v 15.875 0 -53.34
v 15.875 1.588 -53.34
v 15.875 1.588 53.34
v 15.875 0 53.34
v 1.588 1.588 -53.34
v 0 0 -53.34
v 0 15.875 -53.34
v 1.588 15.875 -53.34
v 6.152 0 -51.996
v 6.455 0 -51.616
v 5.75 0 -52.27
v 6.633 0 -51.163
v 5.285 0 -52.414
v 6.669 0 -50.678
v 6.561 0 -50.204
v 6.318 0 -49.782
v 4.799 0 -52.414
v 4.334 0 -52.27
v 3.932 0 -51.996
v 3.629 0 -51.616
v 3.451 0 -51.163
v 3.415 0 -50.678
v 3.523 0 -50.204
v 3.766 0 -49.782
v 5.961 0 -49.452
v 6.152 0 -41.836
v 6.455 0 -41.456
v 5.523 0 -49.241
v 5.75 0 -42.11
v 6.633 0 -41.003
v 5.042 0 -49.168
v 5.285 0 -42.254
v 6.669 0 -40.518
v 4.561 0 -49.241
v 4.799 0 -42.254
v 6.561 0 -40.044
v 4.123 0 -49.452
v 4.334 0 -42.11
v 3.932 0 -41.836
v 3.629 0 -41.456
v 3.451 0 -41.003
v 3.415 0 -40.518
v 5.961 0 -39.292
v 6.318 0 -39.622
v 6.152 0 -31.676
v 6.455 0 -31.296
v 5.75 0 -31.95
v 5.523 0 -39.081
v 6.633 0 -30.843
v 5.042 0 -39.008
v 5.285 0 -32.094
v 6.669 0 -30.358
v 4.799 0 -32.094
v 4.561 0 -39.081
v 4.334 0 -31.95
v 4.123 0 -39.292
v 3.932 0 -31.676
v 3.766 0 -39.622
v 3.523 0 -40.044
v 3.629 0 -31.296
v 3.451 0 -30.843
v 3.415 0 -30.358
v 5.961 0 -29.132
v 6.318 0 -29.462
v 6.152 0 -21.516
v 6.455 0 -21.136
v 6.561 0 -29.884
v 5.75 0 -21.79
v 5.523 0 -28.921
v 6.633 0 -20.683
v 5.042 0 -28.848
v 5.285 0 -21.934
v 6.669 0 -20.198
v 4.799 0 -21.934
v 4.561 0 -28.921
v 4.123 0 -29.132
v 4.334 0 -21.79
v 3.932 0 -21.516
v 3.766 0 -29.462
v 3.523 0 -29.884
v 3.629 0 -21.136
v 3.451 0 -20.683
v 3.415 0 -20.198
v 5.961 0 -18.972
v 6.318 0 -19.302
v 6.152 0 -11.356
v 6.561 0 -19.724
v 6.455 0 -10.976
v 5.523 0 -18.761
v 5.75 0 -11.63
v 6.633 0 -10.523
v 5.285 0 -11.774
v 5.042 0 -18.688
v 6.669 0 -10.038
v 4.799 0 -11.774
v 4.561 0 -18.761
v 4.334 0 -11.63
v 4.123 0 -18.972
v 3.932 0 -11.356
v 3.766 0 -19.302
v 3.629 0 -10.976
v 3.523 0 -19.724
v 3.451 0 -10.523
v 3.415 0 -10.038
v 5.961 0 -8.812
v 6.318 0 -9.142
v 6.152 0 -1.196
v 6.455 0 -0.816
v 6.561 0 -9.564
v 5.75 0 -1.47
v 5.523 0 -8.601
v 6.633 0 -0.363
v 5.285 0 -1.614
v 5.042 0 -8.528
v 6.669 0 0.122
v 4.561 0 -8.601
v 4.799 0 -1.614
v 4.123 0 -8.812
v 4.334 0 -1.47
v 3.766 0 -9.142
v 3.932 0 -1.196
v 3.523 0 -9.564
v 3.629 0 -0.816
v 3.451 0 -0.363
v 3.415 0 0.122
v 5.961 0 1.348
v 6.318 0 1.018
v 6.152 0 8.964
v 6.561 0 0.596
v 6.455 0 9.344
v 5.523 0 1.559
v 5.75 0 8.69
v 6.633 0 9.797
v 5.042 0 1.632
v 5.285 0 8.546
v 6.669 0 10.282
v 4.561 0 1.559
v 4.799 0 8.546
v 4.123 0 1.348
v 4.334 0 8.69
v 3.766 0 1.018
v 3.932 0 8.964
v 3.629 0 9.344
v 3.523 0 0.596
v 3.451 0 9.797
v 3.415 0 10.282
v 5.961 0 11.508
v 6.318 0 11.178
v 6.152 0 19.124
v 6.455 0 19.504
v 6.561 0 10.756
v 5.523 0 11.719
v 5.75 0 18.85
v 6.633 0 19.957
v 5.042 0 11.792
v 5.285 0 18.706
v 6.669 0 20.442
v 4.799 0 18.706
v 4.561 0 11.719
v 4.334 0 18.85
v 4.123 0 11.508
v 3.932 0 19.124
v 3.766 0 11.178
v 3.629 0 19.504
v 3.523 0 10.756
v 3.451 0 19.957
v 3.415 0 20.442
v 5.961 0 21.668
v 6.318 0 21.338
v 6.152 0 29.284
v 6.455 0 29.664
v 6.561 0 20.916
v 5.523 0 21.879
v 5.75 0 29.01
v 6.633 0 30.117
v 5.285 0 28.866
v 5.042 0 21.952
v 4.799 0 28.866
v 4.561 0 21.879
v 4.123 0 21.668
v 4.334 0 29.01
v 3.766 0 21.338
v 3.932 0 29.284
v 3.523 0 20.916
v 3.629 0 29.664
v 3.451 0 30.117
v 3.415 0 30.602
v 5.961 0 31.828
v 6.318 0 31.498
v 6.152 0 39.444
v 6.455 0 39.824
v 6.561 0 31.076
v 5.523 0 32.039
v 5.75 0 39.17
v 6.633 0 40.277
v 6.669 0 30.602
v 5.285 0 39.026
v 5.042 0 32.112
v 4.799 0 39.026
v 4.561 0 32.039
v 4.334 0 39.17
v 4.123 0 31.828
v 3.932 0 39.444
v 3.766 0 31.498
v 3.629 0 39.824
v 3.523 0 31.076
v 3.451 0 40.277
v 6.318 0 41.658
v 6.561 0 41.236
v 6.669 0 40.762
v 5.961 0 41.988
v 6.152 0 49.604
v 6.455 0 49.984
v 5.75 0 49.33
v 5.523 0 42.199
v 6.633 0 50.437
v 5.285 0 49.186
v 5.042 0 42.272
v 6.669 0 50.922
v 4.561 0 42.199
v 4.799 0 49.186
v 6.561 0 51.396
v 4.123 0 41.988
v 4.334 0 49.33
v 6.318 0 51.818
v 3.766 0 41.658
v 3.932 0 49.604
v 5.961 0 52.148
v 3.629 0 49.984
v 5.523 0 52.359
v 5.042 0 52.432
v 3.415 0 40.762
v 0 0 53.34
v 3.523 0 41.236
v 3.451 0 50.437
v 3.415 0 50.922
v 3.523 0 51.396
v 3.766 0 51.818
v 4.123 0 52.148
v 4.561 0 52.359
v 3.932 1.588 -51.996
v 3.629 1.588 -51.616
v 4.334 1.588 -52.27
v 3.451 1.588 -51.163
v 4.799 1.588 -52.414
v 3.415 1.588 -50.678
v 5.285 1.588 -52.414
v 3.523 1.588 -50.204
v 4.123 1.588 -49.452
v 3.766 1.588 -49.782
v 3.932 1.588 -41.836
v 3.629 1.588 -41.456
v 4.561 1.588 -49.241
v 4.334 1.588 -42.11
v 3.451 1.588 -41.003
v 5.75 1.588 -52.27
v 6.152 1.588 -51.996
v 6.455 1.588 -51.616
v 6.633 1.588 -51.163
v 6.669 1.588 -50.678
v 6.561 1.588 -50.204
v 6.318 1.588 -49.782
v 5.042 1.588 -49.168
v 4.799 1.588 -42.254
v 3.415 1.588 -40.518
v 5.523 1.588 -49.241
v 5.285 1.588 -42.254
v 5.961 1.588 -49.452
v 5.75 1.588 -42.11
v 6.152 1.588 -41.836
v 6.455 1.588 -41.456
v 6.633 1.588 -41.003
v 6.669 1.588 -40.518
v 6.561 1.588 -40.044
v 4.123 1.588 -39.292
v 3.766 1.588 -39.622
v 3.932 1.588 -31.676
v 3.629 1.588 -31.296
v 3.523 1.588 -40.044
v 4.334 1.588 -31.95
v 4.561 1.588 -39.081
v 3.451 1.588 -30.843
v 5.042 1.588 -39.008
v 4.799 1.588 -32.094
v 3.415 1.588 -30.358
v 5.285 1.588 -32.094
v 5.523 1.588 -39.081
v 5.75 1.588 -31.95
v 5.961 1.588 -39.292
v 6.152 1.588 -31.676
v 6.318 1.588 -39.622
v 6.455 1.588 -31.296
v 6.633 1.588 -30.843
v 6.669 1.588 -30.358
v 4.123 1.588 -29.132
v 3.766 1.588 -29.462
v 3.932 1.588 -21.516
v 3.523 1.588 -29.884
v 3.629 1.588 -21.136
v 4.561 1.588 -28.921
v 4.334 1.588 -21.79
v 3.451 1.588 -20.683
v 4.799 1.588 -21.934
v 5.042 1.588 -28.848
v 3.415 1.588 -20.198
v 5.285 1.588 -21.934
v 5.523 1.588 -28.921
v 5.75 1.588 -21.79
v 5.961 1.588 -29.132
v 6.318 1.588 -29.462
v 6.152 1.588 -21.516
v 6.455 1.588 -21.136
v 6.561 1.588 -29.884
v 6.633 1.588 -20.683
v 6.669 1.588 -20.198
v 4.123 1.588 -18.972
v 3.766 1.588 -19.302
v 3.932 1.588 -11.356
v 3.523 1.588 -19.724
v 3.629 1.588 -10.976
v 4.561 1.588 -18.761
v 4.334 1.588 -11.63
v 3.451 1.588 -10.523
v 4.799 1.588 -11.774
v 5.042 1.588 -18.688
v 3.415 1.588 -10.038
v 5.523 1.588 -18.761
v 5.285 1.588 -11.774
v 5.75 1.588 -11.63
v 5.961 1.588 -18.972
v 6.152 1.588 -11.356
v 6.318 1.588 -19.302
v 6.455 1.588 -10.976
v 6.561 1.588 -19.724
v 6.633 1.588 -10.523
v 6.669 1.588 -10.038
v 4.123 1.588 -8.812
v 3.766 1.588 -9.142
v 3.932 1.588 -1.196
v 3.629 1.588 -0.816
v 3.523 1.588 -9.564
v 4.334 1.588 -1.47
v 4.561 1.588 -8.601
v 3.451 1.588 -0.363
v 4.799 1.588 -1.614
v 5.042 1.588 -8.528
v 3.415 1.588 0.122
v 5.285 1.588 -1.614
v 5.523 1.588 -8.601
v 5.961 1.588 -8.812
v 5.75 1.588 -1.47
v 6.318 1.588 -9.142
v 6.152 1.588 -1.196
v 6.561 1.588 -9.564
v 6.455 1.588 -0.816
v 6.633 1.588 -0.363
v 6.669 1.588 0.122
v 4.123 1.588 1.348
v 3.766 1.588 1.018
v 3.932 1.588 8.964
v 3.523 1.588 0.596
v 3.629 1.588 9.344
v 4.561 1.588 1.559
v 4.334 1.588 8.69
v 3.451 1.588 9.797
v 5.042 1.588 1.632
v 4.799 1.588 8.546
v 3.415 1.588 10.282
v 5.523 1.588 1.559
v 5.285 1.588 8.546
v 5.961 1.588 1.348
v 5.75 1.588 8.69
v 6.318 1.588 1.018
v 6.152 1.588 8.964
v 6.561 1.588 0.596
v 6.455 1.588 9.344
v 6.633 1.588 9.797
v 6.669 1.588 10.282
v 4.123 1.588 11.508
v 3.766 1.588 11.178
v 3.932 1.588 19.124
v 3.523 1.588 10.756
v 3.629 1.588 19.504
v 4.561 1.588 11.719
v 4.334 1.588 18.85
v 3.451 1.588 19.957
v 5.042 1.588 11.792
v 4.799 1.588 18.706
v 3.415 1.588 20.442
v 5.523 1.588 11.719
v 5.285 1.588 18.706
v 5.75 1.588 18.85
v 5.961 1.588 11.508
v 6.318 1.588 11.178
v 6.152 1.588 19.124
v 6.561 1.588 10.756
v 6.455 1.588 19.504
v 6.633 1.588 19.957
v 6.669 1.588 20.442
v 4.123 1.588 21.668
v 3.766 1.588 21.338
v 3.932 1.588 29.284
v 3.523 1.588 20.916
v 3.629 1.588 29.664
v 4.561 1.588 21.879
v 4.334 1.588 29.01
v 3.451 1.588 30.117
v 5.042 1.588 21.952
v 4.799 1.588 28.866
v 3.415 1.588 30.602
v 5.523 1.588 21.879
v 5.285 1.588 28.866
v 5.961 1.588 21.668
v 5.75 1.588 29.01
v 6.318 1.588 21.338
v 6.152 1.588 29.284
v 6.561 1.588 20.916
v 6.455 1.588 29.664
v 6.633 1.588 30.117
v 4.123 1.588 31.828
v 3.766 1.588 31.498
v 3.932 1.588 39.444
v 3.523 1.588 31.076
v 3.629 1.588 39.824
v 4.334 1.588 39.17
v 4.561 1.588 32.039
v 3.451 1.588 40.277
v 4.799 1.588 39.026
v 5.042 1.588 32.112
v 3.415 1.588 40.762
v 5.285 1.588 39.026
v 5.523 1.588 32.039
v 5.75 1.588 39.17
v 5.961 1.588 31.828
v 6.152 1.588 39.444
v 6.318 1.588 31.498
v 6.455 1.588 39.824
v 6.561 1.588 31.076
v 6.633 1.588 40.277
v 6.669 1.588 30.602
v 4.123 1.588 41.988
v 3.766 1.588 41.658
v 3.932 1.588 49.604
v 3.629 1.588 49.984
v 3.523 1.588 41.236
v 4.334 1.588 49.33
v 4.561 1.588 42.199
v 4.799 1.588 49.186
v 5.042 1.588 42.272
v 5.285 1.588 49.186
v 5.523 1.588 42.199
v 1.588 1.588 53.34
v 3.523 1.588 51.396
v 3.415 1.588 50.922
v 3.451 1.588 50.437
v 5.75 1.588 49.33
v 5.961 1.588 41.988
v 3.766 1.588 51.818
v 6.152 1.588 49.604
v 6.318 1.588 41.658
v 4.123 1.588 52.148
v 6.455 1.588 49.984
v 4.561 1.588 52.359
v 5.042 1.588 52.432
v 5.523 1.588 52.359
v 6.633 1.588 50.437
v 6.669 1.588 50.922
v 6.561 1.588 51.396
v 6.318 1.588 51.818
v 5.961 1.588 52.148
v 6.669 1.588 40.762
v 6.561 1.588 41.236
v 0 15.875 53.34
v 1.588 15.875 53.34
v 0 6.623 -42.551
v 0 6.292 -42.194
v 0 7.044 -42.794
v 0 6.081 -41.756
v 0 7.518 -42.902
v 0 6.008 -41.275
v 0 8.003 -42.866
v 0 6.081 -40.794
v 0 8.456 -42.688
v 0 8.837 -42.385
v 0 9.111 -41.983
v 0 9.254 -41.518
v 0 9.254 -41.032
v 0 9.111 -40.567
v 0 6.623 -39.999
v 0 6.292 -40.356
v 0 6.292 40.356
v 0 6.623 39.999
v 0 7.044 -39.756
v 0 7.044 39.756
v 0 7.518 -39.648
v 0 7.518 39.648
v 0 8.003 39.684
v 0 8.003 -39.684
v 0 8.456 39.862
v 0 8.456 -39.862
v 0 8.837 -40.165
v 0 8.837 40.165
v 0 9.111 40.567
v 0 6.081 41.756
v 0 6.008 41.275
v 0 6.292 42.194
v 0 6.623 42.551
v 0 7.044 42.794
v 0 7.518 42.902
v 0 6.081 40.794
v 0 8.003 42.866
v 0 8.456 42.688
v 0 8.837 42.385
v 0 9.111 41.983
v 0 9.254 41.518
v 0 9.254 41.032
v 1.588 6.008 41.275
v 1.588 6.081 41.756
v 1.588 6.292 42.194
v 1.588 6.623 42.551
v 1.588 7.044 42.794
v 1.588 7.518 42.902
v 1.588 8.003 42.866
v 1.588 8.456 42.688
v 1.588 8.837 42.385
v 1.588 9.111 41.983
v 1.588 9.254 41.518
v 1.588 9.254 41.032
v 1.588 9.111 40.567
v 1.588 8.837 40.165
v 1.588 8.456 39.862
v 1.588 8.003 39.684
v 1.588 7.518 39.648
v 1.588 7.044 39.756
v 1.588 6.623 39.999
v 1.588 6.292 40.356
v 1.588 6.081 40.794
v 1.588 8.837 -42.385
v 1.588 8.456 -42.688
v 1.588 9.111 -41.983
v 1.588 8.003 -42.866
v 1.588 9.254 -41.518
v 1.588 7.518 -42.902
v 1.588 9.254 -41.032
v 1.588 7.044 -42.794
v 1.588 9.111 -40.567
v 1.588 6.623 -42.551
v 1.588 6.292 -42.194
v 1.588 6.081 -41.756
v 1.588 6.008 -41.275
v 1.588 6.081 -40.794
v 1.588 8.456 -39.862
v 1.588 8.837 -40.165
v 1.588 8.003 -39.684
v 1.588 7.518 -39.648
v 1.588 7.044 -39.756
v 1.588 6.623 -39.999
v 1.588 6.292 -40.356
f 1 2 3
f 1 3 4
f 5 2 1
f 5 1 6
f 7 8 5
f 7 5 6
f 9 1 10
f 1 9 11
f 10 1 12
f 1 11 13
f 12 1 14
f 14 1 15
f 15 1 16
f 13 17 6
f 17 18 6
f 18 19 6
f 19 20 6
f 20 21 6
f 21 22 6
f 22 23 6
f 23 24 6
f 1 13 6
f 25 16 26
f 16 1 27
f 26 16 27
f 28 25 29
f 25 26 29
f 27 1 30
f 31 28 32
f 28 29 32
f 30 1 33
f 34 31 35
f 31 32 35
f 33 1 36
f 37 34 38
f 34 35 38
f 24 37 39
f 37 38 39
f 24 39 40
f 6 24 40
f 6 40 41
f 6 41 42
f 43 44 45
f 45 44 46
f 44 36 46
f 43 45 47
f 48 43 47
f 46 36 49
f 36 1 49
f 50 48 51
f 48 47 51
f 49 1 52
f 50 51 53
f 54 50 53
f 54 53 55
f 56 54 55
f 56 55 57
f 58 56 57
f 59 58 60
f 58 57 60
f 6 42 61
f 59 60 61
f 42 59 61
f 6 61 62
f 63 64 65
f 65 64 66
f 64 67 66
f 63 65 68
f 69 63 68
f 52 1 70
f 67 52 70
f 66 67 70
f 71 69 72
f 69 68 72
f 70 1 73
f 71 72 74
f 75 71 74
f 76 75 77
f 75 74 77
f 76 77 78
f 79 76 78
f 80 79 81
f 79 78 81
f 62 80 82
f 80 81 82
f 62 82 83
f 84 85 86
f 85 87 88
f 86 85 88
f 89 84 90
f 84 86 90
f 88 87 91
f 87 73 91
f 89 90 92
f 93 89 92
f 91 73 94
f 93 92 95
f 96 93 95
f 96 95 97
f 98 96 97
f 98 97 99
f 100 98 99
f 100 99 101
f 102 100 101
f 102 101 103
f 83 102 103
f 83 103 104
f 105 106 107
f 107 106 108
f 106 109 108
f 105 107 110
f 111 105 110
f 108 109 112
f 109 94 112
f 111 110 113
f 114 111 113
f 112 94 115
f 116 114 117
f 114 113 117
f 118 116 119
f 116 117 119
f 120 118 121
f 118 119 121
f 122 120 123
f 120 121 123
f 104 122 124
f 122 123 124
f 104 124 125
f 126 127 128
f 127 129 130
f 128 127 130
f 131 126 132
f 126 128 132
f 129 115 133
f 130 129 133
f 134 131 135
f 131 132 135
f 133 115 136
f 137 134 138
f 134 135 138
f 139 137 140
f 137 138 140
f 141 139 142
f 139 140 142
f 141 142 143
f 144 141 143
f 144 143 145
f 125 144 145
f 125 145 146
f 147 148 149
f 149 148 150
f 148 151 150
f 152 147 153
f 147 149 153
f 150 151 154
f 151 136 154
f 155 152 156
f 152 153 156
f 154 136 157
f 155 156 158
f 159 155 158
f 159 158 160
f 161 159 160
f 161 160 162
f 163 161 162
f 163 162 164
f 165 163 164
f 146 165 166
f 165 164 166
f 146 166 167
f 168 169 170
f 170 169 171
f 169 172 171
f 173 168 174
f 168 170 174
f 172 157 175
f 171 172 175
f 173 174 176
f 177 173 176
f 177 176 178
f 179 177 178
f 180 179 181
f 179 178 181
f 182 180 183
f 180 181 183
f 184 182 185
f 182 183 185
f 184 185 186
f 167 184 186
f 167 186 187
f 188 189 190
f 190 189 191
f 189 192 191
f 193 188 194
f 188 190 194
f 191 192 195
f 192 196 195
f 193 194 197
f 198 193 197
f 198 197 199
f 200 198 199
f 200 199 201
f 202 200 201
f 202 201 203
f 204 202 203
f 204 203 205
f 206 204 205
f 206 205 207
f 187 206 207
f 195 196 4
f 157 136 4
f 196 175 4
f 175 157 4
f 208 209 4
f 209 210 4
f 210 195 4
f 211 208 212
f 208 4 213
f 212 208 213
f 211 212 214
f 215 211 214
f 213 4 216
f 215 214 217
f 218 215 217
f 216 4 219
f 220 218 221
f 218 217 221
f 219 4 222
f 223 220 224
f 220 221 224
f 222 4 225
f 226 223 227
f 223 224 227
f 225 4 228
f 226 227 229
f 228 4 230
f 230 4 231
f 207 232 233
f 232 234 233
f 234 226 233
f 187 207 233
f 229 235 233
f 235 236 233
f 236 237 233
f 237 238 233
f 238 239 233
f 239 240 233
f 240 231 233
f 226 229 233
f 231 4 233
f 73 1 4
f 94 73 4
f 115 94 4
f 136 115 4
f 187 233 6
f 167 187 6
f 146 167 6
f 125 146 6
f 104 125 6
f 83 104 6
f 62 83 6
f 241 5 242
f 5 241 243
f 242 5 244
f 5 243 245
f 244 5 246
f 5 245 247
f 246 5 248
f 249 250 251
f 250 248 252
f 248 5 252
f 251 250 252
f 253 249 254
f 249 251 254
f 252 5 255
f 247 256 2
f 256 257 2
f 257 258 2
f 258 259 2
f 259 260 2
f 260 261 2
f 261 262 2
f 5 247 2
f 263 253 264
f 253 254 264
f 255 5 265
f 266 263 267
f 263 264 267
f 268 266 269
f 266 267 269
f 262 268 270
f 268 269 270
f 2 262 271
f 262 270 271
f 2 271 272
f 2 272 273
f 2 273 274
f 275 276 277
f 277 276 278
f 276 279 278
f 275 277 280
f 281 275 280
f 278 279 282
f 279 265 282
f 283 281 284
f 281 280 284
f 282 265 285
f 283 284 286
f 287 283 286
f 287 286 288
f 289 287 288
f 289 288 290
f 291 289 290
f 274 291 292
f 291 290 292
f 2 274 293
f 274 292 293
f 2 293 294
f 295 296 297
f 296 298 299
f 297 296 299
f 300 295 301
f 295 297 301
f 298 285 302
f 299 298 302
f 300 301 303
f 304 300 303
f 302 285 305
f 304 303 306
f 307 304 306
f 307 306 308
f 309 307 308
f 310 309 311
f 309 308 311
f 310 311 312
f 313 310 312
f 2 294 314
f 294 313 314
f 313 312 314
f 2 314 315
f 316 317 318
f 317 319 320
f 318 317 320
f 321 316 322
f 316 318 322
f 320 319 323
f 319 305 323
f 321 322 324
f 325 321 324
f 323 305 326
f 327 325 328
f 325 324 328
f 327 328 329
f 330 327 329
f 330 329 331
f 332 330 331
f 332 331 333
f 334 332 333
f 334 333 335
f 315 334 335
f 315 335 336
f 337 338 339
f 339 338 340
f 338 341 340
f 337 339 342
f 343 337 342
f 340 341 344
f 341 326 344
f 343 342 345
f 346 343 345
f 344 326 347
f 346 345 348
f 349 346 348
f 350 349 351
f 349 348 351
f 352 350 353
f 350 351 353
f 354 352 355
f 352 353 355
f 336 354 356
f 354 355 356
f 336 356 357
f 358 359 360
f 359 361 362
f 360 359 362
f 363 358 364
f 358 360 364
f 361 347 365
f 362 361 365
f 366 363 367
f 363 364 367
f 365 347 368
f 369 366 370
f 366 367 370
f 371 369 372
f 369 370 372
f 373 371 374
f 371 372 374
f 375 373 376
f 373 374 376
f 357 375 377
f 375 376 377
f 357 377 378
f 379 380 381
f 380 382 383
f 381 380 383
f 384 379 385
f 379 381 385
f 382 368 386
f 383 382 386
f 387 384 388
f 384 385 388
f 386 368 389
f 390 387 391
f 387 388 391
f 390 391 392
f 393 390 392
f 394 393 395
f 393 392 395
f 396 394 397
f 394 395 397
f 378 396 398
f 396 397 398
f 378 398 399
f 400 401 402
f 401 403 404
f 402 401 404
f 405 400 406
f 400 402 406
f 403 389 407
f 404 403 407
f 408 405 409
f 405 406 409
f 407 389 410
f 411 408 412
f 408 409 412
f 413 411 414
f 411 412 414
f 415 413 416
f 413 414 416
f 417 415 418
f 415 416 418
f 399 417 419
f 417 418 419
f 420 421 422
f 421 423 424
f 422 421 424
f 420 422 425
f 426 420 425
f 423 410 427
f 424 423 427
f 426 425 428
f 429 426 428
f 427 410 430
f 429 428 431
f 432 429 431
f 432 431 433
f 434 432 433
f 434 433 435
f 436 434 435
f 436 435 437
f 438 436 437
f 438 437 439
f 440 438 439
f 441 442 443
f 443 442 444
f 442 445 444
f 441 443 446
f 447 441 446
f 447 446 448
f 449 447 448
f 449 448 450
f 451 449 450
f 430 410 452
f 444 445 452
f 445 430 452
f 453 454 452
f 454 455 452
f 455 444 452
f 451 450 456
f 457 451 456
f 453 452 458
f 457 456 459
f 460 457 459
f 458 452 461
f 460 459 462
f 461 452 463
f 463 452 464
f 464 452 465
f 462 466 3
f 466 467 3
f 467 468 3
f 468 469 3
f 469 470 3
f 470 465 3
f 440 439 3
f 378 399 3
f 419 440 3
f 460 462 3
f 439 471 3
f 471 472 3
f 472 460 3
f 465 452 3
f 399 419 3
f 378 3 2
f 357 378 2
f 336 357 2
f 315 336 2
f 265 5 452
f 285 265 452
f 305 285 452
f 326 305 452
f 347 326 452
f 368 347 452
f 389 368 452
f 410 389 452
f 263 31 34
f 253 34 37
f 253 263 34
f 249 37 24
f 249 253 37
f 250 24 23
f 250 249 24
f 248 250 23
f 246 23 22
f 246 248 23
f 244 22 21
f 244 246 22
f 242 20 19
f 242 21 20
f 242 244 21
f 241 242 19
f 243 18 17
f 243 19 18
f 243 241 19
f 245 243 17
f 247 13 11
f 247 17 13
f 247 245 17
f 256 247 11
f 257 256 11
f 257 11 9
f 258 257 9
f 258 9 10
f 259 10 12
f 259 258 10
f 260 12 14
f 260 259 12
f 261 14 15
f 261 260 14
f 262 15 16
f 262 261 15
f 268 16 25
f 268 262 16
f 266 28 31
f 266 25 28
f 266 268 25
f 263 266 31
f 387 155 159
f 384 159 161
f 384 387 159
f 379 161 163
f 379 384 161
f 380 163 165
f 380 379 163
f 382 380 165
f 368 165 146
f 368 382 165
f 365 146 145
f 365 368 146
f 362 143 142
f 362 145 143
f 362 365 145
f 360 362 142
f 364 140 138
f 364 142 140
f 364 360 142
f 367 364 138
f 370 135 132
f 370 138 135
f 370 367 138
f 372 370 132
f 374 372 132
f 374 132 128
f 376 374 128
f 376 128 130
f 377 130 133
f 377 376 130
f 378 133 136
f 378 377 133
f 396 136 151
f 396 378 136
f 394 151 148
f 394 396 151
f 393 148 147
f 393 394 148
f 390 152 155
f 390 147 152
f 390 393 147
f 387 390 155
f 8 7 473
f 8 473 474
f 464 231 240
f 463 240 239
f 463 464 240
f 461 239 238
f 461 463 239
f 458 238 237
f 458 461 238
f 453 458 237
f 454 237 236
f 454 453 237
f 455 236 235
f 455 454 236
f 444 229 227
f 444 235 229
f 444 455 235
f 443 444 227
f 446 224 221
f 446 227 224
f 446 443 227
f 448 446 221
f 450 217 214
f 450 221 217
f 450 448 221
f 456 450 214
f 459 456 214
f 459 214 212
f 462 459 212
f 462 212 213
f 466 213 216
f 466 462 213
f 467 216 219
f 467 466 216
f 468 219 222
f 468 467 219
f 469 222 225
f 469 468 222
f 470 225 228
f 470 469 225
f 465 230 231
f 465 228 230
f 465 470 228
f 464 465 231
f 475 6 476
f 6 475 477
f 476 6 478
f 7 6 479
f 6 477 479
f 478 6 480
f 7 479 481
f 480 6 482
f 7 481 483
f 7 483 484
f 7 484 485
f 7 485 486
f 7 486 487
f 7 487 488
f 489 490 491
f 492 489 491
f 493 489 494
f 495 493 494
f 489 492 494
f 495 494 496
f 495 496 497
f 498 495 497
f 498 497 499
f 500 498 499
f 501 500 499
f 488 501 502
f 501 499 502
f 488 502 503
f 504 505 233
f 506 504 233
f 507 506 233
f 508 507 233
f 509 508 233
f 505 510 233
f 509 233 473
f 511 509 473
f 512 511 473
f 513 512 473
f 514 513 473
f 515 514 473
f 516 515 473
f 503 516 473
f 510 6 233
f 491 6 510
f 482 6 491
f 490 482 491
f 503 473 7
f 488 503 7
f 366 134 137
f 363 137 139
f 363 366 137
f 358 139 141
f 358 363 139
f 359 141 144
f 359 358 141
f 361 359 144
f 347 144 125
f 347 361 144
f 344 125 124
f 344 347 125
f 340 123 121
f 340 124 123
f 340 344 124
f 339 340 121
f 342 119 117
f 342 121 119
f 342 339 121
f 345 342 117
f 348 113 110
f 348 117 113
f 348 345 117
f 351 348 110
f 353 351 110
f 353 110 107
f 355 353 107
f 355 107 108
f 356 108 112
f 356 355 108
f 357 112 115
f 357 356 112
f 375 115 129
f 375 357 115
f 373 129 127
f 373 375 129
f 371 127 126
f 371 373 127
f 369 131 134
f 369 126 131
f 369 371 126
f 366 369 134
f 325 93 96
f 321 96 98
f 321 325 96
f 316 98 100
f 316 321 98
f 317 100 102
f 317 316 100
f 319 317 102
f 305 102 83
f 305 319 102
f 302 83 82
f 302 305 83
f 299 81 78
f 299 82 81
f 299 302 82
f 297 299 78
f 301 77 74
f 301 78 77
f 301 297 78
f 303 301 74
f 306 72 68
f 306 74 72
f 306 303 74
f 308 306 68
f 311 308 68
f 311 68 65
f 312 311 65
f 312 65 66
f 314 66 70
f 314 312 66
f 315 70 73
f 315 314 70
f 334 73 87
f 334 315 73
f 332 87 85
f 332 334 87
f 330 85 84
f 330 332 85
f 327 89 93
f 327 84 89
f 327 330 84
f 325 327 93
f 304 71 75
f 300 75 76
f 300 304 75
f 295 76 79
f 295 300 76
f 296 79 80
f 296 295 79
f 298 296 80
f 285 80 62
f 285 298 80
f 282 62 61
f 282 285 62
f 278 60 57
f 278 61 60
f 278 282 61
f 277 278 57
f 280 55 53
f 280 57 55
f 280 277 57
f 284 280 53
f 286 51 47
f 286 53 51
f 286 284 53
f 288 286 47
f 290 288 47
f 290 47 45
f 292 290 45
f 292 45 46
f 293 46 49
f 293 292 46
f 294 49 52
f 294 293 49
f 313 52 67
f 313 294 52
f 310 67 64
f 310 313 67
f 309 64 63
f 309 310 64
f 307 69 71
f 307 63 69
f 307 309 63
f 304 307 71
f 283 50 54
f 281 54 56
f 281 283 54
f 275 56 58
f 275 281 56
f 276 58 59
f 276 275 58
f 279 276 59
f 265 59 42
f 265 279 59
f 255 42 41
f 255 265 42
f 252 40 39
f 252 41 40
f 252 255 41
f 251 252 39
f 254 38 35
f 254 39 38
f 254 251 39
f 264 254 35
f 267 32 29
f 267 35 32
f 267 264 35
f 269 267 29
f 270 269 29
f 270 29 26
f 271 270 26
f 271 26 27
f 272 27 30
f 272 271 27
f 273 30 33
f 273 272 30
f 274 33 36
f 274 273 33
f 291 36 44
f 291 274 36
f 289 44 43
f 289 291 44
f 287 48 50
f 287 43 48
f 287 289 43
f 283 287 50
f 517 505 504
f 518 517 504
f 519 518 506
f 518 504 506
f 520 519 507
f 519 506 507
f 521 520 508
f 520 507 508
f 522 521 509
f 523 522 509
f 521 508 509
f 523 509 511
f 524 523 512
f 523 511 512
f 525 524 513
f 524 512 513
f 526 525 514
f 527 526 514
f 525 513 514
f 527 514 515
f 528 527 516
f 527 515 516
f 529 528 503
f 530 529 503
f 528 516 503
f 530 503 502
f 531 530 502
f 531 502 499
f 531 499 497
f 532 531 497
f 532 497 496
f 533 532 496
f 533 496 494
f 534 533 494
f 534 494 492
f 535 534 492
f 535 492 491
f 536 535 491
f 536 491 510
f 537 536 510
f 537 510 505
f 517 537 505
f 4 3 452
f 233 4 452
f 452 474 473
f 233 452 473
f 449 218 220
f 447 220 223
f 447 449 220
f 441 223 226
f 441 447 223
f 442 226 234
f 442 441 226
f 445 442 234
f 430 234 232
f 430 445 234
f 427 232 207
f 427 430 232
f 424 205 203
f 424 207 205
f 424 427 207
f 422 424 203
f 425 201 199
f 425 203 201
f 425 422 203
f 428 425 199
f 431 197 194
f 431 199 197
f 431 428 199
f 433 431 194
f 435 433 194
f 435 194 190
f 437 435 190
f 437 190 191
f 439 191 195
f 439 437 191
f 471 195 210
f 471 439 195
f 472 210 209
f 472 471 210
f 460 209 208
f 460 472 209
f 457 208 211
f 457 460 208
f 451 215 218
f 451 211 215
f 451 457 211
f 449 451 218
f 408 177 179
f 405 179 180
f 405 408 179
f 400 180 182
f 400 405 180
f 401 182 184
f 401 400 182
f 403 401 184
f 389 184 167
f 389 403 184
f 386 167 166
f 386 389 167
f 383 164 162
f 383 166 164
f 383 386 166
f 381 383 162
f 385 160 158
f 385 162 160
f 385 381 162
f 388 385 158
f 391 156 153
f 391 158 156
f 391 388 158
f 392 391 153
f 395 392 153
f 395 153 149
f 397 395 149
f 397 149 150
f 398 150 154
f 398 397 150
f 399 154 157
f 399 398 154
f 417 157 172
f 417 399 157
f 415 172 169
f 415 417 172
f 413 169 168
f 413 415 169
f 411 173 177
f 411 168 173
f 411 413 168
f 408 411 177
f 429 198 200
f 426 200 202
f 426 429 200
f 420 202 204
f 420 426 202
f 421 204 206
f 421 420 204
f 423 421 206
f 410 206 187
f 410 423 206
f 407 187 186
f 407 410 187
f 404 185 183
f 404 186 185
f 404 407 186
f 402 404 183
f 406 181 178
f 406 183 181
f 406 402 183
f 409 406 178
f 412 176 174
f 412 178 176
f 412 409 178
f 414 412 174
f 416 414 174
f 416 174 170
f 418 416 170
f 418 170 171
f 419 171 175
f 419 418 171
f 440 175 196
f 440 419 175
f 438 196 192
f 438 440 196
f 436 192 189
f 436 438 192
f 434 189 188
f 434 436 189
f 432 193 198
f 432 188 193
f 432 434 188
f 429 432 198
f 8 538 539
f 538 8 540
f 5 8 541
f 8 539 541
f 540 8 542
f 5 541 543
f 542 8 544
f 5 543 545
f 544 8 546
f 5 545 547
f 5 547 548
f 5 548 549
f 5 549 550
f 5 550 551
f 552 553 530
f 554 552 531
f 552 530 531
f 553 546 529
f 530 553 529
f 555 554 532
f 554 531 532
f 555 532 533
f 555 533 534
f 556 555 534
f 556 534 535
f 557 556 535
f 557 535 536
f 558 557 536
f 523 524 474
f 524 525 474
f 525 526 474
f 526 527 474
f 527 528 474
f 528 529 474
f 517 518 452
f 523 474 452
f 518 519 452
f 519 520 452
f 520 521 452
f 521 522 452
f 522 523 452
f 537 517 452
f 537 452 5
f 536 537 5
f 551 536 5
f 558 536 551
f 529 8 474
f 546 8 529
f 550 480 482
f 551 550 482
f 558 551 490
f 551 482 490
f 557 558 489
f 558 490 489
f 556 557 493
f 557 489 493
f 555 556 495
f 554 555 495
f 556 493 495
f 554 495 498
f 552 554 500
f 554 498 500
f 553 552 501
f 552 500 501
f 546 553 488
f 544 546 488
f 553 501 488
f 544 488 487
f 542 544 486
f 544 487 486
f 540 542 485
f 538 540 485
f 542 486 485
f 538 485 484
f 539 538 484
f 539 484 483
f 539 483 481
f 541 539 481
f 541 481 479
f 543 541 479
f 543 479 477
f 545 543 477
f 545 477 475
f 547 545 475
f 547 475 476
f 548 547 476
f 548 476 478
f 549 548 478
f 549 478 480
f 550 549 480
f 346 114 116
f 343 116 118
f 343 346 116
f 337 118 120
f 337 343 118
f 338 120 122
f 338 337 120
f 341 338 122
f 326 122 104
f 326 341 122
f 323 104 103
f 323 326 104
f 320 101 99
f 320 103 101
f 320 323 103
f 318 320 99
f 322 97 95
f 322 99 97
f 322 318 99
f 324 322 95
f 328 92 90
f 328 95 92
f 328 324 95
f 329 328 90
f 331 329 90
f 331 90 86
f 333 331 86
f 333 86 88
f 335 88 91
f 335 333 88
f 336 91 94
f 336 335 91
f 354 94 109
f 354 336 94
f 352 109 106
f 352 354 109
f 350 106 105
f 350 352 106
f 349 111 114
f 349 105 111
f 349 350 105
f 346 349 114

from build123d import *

# Parameters (mm, degrees)
EXTRUDE1_DEPTH            = 53.34
LPATTERN1_COUNT           = 6
LPATTERN1_PITCH           = 10.16
LPATTERN1_COL_COUNT       = 6
LPATTERN1_COL_PITCH       = 10.16
F_4_CLEARANCE_HOLE2_D     = 3.2639
F_4_CLEARANCE_HOLE2_DEPTH = 15.24
F_4_CLEARANCE_HOLE2_TIP   = 0.980574487


with BuildPart() as part:
    # Sketch1 → Extrude1 (new, symmetric)
    with BuildSketch(Plane.XY):
        Polygon((0, 0), (0, 15.875), (1.5875, 15.875), (1.5875, 1.5875), (15.875, 1.5875), (15.875, 0), align=None)
    extrude(amount=EXTRUDE1_DEPTH, both=True)

    # Sketch3 → #4 Clearance Hole1 (revolve, cut)
    with BuildSketch(Plane(origin=(5.0419, 1.5875, 0), x_dir=(0, 0, 1), z_dir=(1, 0, 0))):
        Polygon((0, 0), (0, 16.220574487), (1.63195, 15.24), (1.63195, 0), align=None)
    f_4_clearance_hole1 = revolve(axis=Axis((5.0419, 7.9375, 0), (0, -1, 0)), mode=Mode.SUBTRACT)

    # LPattern1: #4 Clearance Hole1 ×6
    with Locations(*[(0, 0, i * LPATTERN1_PITCH) for i in range(1, LPATTERN1_COUNT)]):
        add(f_4_clearance_hole1, mode=Mode.SUBTRACT)

    # LPattern1 col: #4 Clearance Hole1 ×6
    with Locations(*[(0, 0, -i * LPATTERN1_COL_PITCH) for i in range(1, LPATTERN1_COL_COUNT)]):
        add(f_4_clearance_hole1, mode=Mode.SUBTRACT)

    # #4 Clearance Hole2
    with Locations(Plane(origin=(1.5875, 7.64032, -41.275), x_dir=(0, 1, 0), z_dir=(1, 0, 0))):
        with Locations((0, 0), (0, 82.55)):
            Hole(F_4_CLEARANCE_HOLE2_D / 2, depth=F_4_CLEARANCE_HOLE2_DEPTH)
            with Locations((0, 0, -(F_4_CLEARANCE_HOLE2_DEPTH + F_4_CLEARANCE_HOLE2_TIP / 2))):  # 118° drill point
                Cone(0, F_4_CLEARANCE_HOLE2_D / 2, F_4_CLEARANCE_HOLE2_TIP, mode=Mode.SUBTRACT)


solid = part.part
